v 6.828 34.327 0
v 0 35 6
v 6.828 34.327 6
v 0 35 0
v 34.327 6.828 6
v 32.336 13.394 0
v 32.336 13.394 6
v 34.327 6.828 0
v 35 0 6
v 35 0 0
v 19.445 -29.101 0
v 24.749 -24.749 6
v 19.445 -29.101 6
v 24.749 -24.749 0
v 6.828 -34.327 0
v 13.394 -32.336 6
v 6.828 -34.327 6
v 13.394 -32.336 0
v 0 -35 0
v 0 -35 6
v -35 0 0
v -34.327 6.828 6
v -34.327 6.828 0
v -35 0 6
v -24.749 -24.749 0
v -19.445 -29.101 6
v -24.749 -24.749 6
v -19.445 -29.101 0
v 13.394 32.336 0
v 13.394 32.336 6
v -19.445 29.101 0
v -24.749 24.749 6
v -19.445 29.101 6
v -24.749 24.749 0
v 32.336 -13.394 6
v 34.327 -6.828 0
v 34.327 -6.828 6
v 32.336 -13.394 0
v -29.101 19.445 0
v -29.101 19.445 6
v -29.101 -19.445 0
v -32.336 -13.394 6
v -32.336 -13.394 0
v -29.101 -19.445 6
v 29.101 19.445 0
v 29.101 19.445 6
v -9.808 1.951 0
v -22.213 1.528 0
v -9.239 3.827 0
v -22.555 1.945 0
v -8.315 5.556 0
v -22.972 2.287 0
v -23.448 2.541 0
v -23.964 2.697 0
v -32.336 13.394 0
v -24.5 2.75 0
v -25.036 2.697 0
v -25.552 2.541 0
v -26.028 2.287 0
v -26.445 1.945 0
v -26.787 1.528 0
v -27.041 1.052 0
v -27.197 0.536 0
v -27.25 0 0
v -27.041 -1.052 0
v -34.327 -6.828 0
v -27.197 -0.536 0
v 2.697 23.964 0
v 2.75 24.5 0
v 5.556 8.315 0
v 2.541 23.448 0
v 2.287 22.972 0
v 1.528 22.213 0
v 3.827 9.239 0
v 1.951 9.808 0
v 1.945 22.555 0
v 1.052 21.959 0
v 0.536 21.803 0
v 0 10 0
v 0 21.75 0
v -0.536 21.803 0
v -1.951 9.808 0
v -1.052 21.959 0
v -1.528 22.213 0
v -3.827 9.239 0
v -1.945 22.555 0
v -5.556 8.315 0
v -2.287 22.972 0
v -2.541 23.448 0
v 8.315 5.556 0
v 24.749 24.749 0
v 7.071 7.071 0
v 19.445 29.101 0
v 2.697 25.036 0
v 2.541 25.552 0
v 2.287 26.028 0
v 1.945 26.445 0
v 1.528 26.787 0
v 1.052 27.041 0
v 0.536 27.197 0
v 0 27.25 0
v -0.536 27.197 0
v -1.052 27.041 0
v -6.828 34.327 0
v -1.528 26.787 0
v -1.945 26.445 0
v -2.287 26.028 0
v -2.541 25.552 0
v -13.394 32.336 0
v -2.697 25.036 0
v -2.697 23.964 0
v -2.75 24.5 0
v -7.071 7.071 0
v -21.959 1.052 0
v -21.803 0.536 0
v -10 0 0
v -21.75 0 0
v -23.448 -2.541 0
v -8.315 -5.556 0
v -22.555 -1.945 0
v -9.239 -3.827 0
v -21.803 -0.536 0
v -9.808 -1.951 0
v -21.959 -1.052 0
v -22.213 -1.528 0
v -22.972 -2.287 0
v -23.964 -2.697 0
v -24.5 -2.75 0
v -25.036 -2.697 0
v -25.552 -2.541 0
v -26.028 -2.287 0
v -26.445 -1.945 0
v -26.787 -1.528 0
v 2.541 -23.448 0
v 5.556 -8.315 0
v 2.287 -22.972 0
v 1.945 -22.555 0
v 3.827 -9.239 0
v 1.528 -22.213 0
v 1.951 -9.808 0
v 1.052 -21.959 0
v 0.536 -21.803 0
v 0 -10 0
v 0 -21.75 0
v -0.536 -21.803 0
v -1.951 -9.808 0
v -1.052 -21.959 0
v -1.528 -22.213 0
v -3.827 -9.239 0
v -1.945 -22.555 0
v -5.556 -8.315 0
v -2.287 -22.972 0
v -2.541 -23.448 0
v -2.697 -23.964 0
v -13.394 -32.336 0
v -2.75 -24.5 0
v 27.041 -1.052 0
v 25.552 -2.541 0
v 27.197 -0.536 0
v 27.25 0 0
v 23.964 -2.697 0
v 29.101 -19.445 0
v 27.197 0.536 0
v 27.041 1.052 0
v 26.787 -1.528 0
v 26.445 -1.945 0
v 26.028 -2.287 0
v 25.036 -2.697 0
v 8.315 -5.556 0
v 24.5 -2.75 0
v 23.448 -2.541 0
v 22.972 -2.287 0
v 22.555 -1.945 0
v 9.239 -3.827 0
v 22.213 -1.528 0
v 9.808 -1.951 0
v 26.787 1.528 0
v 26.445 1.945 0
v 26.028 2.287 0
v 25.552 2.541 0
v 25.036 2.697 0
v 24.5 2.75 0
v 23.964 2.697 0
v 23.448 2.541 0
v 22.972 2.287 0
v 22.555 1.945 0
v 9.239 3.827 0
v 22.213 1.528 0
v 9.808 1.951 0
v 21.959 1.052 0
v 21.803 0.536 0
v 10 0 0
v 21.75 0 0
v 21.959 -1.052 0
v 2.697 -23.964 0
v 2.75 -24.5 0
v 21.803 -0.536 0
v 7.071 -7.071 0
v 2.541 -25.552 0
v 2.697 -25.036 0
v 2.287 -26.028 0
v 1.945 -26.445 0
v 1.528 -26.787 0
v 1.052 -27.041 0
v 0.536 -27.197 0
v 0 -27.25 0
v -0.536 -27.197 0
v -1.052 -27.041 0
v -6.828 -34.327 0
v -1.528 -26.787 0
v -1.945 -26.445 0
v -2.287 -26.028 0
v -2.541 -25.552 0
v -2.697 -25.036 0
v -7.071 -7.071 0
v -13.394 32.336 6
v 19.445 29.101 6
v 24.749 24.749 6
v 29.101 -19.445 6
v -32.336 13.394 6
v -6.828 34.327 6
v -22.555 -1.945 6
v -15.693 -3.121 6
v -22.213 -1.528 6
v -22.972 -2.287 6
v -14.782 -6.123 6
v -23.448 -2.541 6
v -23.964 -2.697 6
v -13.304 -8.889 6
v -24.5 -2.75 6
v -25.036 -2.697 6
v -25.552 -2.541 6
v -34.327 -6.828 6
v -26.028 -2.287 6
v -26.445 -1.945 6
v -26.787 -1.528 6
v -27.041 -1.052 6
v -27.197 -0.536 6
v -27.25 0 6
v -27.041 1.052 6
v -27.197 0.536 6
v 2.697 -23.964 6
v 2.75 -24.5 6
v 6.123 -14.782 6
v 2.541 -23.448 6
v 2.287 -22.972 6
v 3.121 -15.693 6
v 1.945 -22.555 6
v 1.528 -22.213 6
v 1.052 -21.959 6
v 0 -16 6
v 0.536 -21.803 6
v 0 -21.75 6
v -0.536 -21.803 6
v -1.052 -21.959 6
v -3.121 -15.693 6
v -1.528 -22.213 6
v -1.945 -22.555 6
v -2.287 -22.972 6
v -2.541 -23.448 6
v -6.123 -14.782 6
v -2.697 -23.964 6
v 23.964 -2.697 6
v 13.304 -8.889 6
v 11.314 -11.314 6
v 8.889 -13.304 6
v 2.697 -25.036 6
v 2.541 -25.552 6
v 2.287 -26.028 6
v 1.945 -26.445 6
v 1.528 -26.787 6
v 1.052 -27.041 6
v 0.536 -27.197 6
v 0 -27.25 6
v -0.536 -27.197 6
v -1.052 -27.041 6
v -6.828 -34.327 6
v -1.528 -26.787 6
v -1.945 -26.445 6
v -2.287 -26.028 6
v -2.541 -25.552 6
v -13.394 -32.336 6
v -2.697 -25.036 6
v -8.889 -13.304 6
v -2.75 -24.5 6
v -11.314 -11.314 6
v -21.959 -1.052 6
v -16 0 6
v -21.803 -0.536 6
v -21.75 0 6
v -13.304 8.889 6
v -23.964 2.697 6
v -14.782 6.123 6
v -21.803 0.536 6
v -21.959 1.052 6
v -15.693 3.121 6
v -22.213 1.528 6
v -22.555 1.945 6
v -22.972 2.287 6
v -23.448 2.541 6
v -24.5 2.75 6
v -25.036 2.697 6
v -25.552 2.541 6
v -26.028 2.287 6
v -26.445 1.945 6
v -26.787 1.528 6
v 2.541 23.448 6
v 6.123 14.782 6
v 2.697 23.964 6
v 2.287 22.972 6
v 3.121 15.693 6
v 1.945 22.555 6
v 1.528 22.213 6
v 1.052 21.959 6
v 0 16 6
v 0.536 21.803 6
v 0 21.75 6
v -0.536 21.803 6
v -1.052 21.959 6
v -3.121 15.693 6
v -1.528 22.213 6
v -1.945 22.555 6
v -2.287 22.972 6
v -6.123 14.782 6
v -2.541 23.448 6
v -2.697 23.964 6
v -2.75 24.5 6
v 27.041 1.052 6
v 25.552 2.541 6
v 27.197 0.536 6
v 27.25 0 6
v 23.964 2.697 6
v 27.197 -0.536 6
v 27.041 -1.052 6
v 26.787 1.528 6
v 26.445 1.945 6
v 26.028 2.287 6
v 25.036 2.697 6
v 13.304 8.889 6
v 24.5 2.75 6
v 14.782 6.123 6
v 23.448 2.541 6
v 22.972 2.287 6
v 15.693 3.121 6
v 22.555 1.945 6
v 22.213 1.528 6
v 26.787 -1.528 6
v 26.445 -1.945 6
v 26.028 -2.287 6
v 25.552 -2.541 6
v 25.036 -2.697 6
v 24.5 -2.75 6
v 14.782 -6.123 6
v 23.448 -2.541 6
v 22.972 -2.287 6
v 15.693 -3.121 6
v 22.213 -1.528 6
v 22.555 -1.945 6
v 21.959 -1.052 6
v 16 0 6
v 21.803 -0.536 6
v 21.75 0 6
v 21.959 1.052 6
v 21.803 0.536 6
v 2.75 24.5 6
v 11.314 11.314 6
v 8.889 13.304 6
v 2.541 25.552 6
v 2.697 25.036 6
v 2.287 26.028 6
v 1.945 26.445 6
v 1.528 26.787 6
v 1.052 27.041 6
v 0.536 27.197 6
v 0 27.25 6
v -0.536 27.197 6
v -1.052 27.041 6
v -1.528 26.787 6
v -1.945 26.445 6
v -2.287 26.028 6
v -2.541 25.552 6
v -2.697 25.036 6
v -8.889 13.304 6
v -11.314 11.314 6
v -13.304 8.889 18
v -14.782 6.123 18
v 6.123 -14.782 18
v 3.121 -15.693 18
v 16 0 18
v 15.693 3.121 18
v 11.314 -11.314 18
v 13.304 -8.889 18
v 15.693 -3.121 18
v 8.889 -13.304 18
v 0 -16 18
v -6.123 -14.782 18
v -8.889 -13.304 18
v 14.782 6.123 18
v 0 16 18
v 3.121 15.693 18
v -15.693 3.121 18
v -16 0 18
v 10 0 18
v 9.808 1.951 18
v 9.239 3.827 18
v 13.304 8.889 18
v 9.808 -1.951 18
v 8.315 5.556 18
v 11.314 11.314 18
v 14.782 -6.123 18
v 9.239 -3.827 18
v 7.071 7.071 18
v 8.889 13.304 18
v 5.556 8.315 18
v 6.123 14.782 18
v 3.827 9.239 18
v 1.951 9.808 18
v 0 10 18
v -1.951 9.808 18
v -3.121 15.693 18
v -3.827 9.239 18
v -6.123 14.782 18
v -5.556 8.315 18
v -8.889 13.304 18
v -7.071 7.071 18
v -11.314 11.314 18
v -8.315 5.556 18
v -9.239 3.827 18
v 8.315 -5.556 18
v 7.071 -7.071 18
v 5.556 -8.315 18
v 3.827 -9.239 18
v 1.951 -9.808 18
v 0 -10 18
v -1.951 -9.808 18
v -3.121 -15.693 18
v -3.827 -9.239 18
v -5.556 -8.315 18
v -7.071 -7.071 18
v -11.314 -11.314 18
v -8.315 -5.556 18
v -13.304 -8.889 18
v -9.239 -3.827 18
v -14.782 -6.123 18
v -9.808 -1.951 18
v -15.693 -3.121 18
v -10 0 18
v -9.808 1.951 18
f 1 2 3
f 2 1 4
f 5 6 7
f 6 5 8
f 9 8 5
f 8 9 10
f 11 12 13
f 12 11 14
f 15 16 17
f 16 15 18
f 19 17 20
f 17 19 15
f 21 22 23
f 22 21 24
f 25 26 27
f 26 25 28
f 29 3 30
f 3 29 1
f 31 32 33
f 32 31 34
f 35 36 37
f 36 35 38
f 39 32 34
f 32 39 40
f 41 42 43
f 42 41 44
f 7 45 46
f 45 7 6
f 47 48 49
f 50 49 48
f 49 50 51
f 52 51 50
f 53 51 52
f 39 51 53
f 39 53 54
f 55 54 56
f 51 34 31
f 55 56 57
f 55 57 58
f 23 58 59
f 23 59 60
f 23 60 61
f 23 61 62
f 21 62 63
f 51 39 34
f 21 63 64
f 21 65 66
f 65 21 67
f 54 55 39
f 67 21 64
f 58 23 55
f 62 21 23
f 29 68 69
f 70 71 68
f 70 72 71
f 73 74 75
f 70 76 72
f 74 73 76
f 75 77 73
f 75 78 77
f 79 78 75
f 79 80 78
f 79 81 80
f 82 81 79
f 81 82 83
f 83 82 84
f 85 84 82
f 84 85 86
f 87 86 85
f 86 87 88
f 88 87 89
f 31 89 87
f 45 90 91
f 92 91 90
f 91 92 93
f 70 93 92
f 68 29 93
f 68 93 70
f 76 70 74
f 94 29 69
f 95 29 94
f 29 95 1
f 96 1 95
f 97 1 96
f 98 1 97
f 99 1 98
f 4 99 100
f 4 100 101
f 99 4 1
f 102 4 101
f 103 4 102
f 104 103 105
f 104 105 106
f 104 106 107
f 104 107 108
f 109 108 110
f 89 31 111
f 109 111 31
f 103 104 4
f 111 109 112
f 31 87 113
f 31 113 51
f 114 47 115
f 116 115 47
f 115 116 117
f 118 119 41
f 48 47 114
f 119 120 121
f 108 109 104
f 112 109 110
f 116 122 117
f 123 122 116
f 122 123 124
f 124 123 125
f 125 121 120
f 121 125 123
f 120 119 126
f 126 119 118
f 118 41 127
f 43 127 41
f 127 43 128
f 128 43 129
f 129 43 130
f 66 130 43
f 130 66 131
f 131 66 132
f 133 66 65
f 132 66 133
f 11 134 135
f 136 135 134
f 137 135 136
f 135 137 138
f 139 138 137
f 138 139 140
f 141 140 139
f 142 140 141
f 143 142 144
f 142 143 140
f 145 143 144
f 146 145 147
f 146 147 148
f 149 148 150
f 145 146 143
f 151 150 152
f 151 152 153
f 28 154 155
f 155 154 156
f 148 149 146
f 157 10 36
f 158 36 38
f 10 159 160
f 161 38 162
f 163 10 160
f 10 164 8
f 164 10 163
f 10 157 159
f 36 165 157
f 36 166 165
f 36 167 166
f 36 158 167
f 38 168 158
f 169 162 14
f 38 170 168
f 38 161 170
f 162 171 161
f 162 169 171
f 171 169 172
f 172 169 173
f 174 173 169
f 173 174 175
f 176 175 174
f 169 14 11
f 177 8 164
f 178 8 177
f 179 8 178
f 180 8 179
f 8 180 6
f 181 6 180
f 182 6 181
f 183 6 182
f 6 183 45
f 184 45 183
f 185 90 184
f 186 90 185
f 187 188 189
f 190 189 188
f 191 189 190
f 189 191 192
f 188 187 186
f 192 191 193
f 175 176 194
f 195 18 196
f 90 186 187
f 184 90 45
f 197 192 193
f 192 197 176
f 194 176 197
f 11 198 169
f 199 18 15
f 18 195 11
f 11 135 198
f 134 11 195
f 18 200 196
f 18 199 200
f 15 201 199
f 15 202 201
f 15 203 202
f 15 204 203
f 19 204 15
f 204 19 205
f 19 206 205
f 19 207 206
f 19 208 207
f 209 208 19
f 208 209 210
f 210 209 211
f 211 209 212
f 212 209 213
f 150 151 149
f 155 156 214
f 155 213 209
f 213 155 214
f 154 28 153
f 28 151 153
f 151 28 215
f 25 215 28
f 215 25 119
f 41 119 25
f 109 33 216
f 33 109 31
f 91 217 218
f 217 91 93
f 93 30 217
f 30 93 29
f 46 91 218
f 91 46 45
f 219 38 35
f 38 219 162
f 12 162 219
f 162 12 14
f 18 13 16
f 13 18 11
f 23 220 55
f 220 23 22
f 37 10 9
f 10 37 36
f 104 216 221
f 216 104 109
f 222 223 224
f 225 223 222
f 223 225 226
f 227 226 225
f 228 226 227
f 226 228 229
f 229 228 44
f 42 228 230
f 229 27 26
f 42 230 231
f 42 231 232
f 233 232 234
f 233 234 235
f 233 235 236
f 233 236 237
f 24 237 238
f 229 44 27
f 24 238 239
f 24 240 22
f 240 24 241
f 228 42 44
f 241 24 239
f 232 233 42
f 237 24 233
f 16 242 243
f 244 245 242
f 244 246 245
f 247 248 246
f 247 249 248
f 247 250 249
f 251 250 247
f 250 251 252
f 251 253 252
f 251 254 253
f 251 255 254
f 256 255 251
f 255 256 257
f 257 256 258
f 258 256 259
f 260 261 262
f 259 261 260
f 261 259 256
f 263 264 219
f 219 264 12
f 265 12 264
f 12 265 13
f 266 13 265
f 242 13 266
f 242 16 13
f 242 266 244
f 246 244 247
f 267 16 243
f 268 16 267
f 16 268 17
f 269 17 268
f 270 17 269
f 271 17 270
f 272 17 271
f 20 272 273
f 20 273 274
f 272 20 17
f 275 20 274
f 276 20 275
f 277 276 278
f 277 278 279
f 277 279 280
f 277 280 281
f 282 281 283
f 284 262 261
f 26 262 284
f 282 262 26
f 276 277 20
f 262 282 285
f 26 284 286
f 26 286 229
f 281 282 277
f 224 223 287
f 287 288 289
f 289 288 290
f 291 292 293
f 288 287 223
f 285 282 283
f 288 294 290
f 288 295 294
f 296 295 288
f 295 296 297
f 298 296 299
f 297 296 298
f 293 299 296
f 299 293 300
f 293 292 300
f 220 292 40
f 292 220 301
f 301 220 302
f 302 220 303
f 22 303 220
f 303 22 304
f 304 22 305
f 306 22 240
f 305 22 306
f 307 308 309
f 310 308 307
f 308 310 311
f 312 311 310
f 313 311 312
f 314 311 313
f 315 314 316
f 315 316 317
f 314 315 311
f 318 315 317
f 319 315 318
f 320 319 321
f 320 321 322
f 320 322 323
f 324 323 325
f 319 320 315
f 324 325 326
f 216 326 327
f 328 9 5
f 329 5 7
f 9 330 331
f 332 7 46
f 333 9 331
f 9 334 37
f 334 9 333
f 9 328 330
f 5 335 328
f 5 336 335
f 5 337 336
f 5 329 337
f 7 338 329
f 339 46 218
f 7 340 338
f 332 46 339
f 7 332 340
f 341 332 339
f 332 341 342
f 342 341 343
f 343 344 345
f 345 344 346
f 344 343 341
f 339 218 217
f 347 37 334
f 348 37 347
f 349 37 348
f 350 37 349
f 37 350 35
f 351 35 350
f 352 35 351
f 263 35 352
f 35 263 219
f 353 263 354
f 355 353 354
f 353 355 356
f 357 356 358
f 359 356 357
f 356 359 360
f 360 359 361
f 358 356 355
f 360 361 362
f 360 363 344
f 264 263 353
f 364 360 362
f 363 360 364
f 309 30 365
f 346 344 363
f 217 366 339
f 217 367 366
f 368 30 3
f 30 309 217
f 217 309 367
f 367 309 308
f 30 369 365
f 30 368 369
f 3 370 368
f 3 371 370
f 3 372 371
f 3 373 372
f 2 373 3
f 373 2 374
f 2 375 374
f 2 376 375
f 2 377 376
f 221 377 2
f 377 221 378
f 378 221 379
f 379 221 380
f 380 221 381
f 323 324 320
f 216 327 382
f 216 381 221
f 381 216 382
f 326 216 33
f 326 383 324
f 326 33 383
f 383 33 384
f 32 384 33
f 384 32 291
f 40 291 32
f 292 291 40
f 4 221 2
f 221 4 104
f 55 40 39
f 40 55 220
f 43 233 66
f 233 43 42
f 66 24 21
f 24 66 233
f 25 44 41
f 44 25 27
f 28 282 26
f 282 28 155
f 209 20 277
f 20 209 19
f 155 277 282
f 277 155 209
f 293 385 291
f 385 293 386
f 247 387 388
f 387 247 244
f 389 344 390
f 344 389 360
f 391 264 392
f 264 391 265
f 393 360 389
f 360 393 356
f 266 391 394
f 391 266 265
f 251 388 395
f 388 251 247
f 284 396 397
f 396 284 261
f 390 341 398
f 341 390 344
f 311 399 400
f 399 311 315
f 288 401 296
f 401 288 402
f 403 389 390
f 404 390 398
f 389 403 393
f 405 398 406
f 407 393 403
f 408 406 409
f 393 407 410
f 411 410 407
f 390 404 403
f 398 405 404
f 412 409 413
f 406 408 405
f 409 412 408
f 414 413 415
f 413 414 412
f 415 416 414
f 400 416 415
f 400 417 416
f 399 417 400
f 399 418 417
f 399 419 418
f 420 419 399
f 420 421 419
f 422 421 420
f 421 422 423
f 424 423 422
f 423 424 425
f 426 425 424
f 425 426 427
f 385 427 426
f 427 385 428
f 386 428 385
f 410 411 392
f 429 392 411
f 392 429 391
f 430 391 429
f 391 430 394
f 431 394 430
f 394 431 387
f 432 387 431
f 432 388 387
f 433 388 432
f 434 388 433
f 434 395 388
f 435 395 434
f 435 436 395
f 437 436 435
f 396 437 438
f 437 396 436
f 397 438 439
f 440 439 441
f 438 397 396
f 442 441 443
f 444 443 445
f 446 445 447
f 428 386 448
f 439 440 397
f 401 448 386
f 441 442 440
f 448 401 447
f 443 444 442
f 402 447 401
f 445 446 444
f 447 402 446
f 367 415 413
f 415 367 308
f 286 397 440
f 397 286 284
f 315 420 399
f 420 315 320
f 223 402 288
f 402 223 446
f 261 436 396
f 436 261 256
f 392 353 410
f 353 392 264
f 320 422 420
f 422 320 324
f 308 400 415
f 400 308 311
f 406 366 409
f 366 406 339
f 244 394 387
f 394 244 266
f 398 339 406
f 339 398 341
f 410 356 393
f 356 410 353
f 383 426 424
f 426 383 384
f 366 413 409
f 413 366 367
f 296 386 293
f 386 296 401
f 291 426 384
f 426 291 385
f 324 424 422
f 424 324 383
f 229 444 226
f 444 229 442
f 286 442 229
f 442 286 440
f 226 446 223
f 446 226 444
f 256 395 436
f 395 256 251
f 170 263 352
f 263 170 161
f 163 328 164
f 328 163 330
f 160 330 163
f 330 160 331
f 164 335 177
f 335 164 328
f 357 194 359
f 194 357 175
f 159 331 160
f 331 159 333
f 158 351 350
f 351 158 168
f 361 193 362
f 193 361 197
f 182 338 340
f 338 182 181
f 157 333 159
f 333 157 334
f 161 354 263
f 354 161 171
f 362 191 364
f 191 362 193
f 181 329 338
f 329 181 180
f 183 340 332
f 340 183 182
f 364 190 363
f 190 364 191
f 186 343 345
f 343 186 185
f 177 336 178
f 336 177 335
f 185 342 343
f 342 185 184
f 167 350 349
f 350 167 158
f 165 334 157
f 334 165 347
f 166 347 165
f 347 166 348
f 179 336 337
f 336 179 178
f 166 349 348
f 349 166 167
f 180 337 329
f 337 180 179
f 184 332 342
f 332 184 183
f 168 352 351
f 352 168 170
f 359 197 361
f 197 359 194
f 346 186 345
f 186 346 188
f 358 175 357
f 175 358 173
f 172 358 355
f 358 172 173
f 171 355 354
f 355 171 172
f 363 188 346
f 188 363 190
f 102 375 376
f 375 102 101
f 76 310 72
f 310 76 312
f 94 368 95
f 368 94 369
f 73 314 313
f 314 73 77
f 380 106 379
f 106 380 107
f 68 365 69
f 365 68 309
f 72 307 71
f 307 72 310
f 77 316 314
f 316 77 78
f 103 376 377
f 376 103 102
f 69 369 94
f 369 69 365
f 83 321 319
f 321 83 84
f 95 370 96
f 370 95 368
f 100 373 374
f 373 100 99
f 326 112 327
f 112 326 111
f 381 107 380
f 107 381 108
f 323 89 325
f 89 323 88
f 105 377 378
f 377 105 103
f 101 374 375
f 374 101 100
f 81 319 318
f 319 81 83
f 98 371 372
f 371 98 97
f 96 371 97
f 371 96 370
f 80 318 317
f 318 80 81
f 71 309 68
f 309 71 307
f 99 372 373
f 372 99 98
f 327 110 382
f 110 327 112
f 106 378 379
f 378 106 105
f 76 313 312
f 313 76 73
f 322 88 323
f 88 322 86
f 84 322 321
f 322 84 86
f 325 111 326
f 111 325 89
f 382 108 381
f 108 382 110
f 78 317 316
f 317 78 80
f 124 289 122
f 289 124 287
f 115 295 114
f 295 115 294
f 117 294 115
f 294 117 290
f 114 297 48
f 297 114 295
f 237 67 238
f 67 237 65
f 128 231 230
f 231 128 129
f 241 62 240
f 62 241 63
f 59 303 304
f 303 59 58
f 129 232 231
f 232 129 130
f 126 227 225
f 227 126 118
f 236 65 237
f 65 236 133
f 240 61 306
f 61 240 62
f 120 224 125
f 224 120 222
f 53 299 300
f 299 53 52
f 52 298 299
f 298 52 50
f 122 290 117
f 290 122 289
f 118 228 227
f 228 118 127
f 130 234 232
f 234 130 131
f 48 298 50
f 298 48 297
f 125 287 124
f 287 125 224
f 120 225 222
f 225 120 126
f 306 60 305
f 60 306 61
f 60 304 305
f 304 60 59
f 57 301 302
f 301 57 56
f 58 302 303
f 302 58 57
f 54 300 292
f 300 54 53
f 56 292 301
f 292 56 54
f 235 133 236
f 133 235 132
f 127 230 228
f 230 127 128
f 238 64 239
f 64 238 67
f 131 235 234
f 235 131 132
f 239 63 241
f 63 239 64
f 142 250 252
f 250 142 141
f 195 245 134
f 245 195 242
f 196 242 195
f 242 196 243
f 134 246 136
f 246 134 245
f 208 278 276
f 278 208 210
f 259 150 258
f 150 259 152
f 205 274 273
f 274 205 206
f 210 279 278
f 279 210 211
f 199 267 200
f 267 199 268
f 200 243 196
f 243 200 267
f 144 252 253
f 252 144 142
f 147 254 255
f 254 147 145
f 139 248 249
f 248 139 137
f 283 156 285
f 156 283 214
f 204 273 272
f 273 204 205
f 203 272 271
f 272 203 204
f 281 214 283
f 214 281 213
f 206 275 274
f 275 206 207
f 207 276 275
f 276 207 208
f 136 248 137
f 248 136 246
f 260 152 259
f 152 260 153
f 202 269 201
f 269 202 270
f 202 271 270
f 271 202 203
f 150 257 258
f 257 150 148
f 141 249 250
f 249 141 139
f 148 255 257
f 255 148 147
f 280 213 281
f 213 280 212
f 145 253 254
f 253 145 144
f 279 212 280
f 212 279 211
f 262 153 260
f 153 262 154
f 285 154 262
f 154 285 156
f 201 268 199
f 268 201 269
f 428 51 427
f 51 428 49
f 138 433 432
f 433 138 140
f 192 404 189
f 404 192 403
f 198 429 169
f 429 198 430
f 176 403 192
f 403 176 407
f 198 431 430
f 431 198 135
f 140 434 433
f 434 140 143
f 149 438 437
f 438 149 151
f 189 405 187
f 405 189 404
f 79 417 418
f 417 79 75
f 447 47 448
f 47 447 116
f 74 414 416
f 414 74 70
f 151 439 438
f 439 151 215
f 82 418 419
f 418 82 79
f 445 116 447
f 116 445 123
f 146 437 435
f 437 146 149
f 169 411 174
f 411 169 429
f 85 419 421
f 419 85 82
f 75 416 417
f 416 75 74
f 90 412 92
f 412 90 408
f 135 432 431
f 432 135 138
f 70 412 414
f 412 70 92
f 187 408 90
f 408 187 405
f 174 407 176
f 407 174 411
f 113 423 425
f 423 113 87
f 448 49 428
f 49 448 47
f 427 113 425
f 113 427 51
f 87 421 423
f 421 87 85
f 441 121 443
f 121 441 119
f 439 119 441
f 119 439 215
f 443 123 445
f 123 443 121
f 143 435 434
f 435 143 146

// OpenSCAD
$fn = 32;

// ----------------------------------------------------------------------
// Flange Ø70 x 6
// 4 holes on a Ø49 bolt circle, bolted joints
// ----------------------------------------------------------------------

// --- parameters (mm) ---
flange_d = 70;  // outside diameter of the flange
thickness = 6;  // flange thickness
holes = 4;      // number of bolt holes
pcd = 49;       // bolt circle diameter
start_deg = 0;  // angle of the first hole, from +X
hole_d = 5.5;   // bolt hole diameter
bore_d = 20;    // central through bore
hub_d = 32;     // hub outside diameter
hub_h = 12;     // hub height above the flange face (0 = no hub)

// --- derived feature positions (mm) ---
height = thickness + hub_h;  // = 18   overall height of the part
pcd_r = pcd / 2;             // = 24.5   bolt circle radius
hole_step = 360 / holes;     // = 90   angular pitch
feature_centers = [
  [pcd_r * cos(start_deg + 0 * hole_step), pcd_r * sin(start_deg + 0 * hole_step)],
  [pcd_r * cos(start_deg + 1 * hole_step), pcd_r * sin(start_deg + 1 * hole_step)],
  [pcd_r * cos(start_deg + 2 * hole_step), pcd_r * sin(start_deg + 2 * hole_step)],
  [pcd_r * cos(start_deg + 3 * hole_step), pcd_r * sin(start_deg + 3 * hole_step)]
];   // bolt hole centres on the pitch circle

// flange disc, every hole and the bore cut straight through
difference() {
  union() {
    cylinder(d = flange_d, h = thickness);
    cylinder(d = hub_d, h = height);  // hub, overlapped into the flange
  }
  translate([0, 0, -1]) cylinder(d = bore_d, h = height + 2);  // bore, through
  for (centre = feature_centers)
    translate([centre[0], centre[1], -1]) cylinder(d = hole_d, h = thickness + 2);
}
